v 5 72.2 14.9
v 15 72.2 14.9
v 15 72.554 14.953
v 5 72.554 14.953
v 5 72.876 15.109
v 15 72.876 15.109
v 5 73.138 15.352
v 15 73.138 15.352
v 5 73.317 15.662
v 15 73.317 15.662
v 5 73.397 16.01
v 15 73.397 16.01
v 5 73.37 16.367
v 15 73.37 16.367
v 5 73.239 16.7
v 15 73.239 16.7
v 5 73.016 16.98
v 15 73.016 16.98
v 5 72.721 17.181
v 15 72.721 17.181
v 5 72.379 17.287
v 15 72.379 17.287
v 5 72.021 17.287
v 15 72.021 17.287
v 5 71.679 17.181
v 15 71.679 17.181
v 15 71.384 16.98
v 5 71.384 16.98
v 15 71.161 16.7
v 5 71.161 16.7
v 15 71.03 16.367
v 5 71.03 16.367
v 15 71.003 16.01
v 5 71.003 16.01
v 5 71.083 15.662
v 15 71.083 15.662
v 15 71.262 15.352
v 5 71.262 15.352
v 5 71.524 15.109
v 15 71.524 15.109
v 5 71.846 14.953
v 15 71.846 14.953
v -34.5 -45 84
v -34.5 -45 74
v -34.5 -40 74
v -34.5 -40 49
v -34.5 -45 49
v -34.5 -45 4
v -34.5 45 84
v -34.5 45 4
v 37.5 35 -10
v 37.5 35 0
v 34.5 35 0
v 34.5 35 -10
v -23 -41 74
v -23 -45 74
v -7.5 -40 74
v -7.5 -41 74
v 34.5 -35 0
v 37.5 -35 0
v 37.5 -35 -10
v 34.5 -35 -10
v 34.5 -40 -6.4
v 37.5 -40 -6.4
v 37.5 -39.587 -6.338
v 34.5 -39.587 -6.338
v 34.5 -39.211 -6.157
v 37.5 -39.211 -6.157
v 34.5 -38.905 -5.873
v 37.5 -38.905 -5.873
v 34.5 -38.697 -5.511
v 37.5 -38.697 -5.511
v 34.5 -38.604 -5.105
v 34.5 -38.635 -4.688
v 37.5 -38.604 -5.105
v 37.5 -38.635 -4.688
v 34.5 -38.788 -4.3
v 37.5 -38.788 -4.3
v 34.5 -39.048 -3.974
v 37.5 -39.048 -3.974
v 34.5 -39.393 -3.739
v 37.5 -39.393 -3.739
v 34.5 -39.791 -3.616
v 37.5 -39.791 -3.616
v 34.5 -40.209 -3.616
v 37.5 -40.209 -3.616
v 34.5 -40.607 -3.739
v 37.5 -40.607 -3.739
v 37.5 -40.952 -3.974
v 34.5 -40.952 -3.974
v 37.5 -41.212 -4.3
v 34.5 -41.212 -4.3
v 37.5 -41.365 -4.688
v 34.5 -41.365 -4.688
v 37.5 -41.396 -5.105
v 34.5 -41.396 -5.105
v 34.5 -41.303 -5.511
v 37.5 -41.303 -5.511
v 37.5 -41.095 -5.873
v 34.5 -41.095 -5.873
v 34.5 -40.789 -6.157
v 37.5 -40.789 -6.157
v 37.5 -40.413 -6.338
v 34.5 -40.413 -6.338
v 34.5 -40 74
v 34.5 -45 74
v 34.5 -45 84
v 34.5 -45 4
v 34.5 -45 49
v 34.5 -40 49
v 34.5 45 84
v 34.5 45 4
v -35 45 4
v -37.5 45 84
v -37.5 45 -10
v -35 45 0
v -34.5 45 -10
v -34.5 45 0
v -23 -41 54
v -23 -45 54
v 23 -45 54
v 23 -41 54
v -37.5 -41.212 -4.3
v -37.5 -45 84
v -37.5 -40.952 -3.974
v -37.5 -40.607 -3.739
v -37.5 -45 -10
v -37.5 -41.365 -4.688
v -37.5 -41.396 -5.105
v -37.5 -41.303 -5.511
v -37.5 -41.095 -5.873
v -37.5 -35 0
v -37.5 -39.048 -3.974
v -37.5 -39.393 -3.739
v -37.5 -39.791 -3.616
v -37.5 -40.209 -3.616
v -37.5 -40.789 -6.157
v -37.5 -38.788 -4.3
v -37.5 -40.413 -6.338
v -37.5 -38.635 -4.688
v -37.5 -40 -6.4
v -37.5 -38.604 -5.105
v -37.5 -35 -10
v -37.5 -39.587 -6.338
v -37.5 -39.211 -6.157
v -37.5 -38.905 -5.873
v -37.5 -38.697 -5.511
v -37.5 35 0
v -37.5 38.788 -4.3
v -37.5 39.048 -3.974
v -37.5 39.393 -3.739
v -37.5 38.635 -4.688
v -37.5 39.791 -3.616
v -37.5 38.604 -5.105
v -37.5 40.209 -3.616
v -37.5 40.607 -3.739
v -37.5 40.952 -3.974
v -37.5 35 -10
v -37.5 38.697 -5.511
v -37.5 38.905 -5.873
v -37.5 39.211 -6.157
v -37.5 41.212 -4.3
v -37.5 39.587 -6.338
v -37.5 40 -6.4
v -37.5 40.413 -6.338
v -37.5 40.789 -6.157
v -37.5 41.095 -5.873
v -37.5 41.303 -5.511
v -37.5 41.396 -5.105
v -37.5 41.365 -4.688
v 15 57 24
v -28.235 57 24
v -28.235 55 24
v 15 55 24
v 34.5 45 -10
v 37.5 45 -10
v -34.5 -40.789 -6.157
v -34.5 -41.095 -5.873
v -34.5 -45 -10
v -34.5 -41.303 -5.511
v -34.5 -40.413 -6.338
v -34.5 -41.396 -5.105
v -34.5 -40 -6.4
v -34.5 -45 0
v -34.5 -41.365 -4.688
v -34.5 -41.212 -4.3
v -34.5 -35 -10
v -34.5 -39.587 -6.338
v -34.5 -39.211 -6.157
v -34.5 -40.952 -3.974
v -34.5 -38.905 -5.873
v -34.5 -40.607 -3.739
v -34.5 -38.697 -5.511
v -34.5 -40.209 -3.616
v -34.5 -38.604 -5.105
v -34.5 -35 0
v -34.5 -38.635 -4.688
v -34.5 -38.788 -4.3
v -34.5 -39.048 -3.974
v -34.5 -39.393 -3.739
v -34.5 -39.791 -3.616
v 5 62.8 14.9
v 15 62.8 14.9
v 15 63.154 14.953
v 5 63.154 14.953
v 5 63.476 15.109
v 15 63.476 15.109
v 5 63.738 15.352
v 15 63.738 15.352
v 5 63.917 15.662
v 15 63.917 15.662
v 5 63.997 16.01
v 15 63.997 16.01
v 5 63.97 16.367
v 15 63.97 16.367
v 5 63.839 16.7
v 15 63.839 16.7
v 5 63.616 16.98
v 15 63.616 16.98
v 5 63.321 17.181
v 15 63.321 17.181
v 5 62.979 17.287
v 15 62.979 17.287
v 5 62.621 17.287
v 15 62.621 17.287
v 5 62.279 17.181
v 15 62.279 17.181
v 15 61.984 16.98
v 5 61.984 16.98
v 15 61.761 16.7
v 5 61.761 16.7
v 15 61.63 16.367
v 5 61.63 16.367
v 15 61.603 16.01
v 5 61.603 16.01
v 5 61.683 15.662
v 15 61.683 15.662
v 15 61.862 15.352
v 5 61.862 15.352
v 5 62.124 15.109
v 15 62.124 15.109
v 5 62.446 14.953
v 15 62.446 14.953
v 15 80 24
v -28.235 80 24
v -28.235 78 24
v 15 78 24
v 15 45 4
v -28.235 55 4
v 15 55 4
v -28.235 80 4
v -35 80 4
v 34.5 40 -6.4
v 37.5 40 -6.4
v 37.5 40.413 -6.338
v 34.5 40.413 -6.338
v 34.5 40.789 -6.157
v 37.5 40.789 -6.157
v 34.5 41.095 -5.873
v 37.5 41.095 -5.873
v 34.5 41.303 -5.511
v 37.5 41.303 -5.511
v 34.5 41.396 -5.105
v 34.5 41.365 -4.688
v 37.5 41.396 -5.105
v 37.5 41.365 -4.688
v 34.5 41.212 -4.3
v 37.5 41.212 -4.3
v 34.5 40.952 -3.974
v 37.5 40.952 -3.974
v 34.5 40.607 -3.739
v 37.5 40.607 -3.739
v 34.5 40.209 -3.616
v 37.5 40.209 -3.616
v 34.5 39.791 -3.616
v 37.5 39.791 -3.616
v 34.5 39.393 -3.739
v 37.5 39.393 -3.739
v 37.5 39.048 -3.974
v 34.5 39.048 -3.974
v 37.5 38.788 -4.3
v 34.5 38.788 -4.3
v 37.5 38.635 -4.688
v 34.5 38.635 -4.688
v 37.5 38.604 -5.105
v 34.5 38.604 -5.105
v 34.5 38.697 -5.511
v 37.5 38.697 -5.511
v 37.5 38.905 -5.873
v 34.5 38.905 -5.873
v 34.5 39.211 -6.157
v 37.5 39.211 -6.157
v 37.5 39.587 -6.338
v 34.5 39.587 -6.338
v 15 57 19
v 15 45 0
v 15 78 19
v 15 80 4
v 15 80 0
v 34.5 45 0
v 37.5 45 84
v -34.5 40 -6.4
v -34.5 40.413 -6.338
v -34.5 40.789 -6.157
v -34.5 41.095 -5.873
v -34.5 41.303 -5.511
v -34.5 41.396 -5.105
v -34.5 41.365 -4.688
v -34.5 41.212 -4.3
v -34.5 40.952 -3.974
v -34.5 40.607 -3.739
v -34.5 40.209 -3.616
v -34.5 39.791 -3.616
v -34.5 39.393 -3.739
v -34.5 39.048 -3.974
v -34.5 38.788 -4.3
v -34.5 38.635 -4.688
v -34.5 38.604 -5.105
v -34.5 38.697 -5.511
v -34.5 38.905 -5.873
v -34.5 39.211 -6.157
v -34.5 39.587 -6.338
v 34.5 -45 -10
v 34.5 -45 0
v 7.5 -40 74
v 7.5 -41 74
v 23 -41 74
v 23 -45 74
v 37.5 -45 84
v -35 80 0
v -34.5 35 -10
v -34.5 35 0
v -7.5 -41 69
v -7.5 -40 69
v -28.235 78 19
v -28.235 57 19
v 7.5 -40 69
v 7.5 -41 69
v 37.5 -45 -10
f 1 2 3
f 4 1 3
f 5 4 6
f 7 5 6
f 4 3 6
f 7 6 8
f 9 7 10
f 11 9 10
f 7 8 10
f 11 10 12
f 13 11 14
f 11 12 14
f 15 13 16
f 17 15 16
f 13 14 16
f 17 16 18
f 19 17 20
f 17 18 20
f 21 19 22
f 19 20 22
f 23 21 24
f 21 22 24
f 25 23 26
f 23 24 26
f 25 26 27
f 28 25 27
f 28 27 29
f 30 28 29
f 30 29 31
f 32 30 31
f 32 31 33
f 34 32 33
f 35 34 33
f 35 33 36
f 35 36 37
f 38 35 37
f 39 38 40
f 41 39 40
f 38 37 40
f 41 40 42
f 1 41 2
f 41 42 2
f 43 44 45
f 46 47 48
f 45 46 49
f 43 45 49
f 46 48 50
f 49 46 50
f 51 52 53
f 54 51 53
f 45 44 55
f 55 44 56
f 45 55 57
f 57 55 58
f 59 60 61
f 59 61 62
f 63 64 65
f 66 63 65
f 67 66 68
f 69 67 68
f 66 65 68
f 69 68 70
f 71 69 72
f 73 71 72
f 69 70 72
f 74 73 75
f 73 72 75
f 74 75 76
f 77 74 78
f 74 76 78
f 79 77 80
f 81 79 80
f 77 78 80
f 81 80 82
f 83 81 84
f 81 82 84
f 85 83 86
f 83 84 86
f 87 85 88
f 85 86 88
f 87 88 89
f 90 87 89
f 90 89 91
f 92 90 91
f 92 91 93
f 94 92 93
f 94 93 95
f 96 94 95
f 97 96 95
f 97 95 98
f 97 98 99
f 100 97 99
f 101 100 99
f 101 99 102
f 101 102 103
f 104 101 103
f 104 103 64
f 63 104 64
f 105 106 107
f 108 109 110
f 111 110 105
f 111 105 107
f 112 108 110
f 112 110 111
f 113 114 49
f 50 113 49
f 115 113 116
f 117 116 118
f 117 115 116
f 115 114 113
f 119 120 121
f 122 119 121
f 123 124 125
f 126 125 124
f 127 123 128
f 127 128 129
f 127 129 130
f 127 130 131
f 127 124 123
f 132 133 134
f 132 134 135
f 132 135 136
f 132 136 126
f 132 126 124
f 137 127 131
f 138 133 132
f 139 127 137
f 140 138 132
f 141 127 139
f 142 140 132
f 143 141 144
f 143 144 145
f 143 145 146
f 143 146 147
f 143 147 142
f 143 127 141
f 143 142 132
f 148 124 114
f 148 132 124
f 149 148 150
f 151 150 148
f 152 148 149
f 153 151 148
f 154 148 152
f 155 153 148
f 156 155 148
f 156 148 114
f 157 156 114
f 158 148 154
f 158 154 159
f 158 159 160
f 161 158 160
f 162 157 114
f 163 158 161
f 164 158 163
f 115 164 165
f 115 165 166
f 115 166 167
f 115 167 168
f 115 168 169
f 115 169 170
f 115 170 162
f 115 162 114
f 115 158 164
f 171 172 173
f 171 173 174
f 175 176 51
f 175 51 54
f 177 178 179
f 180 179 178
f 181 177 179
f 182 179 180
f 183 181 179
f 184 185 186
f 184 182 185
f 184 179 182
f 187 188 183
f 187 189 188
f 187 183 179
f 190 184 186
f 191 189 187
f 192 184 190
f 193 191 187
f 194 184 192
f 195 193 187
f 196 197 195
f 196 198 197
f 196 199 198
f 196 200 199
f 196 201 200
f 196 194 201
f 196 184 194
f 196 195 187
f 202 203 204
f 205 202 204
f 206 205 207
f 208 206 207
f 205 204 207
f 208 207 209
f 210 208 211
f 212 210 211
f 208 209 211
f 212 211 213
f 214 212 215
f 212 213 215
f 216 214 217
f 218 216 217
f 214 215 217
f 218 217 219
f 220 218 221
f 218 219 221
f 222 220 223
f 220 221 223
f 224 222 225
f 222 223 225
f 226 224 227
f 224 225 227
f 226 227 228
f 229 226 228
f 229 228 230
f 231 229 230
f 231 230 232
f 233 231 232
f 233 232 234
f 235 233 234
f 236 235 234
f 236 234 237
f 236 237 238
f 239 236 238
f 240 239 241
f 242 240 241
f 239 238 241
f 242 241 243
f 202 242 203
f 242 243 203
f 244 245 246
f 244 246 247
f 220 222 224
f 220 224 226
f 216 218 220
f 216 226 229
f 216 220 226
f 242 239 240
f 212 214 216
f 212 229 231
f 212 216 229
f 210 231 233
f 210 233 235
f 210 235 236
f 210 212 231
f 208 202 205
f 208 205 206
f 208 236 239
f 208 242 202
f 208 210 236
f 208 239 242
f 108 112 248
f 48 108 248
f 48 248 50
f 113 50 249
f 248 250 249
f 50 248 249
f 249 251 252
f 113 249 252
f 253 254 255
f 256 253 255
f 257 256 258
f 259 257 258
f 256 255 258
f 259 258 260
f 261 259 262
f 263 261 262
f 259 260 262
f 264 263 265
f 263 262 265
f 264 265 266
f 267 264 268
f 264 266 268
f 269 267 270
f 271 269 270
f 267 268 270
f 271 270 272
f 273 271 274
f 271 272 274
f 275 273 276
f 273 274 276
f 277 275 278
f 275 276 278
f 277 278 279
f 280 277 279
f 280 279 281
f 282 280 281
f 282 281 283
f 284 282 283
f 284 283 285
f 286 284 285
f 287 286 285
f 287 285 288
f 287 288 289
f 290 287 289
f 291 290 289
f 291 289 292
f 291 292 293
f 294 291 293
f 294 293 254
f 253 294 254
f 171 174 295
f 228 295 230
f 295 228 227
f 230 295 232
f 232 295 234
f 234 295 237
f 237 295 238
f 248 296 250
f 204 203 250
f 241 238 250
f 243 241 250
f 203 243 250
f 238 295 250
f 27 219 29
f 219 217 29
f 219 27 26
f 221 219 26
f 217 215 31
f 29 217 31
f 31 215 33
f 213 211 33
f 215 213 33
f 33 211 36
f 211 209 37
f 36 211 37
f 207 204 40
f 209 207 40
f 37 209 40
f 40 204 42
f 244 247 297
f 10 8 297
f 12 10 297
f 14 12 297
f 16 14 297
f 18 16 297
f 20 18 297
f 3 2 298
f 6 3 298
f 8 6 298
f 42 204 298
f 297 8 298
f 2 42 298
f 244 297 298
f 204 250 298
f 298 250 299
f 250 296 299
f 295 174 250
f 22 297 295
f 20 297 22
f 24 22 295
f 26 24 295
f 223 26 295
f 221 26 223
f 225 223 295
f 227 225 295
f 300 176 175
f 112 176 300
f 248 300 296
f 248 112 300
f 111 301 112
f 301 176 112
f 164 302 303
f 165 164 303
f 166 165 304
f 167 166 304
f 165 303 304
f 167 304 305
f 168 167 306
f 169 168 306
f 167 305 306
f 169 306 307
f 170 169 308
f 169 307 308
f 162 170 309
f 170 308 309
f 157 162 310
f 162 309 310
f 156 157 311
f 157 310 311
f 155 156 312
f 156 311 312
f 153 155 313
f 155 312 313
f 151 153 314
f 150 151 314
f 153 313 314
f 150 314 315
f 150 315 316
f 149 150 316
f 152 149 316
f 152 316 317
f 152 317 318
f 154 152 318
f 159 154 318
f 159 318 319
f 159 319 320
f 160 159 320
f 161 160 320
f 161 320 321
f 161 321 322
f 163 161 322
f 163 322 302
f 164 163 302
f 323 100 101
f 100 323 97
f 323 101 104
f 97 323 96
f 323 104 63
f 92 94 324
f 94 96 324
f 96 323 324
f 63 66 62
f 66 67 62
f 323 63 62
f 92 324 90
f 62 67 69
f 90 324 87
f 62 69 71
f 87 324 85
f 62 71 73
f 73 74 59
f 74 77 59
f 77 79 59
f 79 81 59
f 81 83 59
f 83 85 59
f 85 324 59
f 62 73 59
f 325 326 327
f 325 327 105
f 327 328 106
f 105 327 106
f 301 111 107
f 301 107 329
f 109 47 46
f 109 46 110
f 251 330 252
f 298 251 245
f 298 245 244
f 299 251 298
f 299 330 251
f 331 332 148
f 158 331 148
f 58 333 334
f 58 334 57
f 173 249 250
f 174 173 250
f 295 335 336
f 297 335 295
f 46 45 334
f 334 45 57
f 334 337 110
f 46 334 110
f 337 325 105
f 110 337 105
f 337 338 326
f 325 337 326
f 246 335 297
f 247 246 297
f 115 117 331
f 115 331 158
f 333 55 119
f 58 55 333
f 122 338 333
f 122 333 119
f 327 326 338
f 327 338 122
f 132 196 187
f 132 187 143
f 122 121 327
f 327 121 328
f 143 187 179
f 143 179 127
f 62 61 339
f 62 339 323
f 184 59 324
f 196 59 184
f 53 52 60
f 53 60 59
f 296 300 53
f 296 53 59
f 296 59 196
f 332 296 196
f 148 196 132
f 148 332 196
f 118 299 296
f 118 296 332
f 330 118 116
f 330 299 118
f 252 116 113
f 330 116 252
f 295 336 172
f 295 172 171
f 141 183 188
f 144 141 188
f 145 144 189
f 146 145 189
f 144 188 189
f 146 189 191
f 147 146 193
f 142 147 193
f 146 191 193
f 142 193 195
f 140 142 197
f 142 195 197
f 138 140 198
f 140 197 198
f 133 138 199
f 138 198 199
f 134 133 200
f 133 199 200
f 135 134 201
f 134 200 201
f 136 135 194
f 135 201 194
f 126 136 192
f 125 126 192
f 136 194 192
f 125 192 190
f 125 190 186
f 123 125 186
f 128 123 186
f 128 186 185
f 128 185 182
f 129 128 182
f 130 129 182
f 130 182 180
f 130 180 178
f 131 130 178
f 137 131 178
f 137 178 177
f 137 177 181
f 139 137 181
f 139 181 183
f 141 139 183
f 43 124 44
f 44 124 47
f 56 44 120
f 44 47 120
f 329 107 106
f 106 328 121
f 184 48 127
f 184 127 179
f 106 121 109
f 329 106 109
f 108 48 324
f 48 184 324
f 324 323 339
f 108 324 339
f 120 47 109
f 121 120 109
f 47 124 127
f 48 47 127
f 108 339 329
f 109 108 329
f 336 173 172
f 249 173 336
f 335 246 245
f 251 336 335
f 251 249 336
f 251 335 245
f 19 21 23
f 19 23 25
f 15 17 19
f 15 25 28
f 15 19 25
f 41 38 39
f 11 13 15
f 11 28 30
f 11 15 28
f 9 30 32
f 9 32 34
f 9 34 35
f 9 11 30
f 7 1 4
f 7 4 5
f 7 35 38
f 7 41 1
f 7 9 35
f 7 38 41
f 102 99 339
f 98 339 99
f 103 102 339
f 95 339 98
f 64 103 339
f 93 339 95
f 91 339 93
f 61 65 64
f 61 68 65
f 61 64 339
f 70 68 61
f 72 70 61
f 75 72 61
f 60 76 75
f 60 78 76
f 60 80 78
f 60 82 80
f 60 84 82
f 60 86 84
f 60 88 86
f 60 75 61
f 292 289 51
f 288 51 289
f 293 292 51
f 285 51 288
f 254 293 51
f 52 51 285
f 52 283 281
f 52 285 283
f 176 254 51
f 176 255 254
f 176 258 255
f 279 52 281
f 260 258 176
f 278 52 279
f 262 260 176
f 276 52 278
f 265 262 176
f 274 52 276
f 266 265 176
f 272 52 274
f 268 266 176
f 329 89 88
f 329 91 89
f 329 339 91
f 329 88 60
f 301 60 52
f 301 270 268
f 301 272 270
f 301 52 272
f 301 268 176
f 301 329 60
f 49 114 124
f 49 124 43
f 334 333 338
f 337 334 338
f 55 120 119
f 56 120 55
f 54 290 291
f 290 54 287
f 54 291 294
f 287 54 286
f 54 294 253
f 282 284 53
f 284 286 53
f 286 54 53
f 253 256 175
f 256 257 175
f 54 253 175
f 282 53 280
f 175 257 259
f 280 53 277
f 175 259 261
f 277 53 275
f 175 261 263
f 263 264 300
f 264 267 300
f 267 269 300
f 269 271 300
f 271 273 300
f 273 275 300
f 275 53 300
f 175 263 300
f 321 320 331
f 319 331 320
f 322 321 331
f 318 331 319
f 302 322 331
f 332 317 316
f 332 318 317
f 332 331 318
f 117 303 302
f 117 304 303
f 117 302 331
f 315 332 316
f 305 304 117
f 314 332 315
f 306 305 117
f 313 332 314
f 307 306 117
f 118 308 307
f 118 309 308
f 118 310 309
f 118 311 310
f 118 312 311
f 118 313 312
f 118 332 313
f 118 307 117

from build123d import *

# Parameters (mm, degrees)
EXTRUDE_1_DEPTH     = 4
SKETCH_3_W          = 43.235473071
SKETCH_3_H          = 2
EXTRUDE_2_DEPTH     = 20
SKETCH_4_W          = 43.235473071
SKETCH_4_H          = 21
EXTRUDE_3_DEPTH     = 15
SKETCH_8_W          = 3
SKETCH_8_H          = 10
EXTRUDE_4_DEPTH     = 10
SKETCH_10_R         = 1.4
CUT_EXTRUDE_1_DEPTH = 83
SKETCH_11_W         = 3
SKETCH_11_H         = 90
EXTRUDE_5_DEPTH     = 80
SKETCH_12_W         = 72.707770749
SKETCH_12_H         = 25
EXTRUDE_6_DEPTH     = 5
SKETCH_13_W         = 46
SKETCH_13_H         = 20
CUT_EXTRUDE_2_DEPTH = 4
CUT_EXTRUDE_3_REACH = 123
SKETCH_14_W         = 15
SKETCH_14_H         = 5
SKETCH_15_R         = 1.2
CUT_EXTRUDE_4_DEPTH = 10


with BuildPart() as part:
    # 草圖1 → 填料-伸長1 (new body)
    with BuildSketch(Plane.XY):
        Polygon((-37.5, 45), (-35, 45), (-35, 80), (15, 80), (15, 45), (37.5, 45), (37.5, -45), (-37.5, -45), align=None)
    extrude(amount=EXTRUDE_1_DEPTH)

    # 草圖3 → 填料-伸長2 (add)
    with BuildSketch(Plane.XY.offset(4)):
        with Locations((-6.617736535, 56)):
            Rectangle(SKETCH_3_W, SKETCH_3_H)
        with Locations((-6.617736535, 79)):
            Rectangle(SKETCH_3_W, SKETCH_3_H)
    extrude(amount=EXTRUDE_2_DEPTH)

    # 草圖4 → 填料-伸長3 (add)
    with BuildSketch(Plane.XY.offset(4)):
        with Locations((-6.617736535, 67.5)):
            Rectangle(SKETCH_4_W, SKETCH_4_H)
    extrude(amount=EXTRUDE_3_DEPTH)

    # 草圖8 → 填料-伸長4 (add)
    with BuildSketch(Plane(origin=(0, 0, 0), x_dir=(-1, 0, 0), z_dir=(0, 0, -1))):
        with Locations((-36, 40)):
            Rectangle(SKETCH_8_W, SKETCH_8_H)
        with Locations((36, 40)):
            Rectangle(SKETCH_8_W, SKETCH_8_H)
        with Locations((36, -40)):
            Rectangle(SKETCH_8_W, SKETCH_8_H)
        with Locations((-36, -40)):
            Rectangle(SKETCH_8_W, SKETCH_8_H)
    extrude(amount=EXTRUDE_4_DEPTH)

    # 草圖10 → 除料-伸長1 (cut)
    with BuildSketch(Plane(origin=(37.5, 0, 0), x_dir=(0, 0, -1), z_dir=(1, 0, 0))):
        with Locations((5, 40)):
            Circle(SKETCH_10_R)
        with Locations((5, -40)):
            Circle(SKETCH_10_R)
    extrude(amount=-CUT_EXTRUDE_1_DEPTH, mode=Mode.SUBTRACT)

    # 草圖11 → 填料-伸長5 (add)
    with BuildSketch(Plane.XY.offset(4)):
        with Locations((-36, 0)):
            Rectangle(SKETCH_11_W, SKETCH_11_H)
        with Locations((36, 0)):
            Rectangle(SKETCH_11_W, SKETCH_11_H)
    extrude(amount=EXTRUDE_5_DEPTH)

    # 草圖12 → 填料-伸長6 (add)
    with BuildSketch(Plane.XZ.offset(45)):
        with Locations((0.126228768, 61.5)):
            Rectangle(SKETCH_12_W, SKETCH_12_H)
    extrude(amount=-EXTRUDE_6_DEPTH)

    # 草圖13 → 除料-伸長2 (cut)
    with BuildSketch(Plane.XZ.offset(45)):
        with Locations((0, 64)):
            Rectangle(SKETCH_13_W, SKETCH_13_H)
    extrude(amount=-CUT_EXTRUDE_2_DEPTH, mode=Mode.SUBTRACT)

    # 草圖14 → 除料-伸長3 (cut, up to next)
    with BuildSketch(Plane.XZ.offset(41), mode=Mode.PRIVATE) as cut_extrude_3_sk1:
        with Locations((0, 71.5)):
            Rectangle(SKETCH_14_W, SKETCH_14_H)
    cut_extrude_3_tool1 = extrude(cut_extrude_3_sk1.sketch, amount=-CUT_EXTRUDE_3_REACH, mode=Mode.PRIVATE) & part.part
    add(cut_extrude_3_tool1.solids().sort_by_distance((0, -41, 71.5))[0], mode=Mode.SUBTRACT)

    # 草圖15 → 除料-伸長4 (cut)
    with BuildSketch(Plane(origin=(15, 0, 0), x_dir=(0, 0, -1), z_dir=(1, 0, 0))):
        with Locations((-16.1, 72.2)):
            Circle(SKETCH_15_R)
        with Locations((-16.1, 62.8)):
            Circle(SKETCH_15_R)
    extrude(amount=-CUT_EXTRUDE_4_DEPTH, mode=Mode.SUBTRACT)


solid = part.part
